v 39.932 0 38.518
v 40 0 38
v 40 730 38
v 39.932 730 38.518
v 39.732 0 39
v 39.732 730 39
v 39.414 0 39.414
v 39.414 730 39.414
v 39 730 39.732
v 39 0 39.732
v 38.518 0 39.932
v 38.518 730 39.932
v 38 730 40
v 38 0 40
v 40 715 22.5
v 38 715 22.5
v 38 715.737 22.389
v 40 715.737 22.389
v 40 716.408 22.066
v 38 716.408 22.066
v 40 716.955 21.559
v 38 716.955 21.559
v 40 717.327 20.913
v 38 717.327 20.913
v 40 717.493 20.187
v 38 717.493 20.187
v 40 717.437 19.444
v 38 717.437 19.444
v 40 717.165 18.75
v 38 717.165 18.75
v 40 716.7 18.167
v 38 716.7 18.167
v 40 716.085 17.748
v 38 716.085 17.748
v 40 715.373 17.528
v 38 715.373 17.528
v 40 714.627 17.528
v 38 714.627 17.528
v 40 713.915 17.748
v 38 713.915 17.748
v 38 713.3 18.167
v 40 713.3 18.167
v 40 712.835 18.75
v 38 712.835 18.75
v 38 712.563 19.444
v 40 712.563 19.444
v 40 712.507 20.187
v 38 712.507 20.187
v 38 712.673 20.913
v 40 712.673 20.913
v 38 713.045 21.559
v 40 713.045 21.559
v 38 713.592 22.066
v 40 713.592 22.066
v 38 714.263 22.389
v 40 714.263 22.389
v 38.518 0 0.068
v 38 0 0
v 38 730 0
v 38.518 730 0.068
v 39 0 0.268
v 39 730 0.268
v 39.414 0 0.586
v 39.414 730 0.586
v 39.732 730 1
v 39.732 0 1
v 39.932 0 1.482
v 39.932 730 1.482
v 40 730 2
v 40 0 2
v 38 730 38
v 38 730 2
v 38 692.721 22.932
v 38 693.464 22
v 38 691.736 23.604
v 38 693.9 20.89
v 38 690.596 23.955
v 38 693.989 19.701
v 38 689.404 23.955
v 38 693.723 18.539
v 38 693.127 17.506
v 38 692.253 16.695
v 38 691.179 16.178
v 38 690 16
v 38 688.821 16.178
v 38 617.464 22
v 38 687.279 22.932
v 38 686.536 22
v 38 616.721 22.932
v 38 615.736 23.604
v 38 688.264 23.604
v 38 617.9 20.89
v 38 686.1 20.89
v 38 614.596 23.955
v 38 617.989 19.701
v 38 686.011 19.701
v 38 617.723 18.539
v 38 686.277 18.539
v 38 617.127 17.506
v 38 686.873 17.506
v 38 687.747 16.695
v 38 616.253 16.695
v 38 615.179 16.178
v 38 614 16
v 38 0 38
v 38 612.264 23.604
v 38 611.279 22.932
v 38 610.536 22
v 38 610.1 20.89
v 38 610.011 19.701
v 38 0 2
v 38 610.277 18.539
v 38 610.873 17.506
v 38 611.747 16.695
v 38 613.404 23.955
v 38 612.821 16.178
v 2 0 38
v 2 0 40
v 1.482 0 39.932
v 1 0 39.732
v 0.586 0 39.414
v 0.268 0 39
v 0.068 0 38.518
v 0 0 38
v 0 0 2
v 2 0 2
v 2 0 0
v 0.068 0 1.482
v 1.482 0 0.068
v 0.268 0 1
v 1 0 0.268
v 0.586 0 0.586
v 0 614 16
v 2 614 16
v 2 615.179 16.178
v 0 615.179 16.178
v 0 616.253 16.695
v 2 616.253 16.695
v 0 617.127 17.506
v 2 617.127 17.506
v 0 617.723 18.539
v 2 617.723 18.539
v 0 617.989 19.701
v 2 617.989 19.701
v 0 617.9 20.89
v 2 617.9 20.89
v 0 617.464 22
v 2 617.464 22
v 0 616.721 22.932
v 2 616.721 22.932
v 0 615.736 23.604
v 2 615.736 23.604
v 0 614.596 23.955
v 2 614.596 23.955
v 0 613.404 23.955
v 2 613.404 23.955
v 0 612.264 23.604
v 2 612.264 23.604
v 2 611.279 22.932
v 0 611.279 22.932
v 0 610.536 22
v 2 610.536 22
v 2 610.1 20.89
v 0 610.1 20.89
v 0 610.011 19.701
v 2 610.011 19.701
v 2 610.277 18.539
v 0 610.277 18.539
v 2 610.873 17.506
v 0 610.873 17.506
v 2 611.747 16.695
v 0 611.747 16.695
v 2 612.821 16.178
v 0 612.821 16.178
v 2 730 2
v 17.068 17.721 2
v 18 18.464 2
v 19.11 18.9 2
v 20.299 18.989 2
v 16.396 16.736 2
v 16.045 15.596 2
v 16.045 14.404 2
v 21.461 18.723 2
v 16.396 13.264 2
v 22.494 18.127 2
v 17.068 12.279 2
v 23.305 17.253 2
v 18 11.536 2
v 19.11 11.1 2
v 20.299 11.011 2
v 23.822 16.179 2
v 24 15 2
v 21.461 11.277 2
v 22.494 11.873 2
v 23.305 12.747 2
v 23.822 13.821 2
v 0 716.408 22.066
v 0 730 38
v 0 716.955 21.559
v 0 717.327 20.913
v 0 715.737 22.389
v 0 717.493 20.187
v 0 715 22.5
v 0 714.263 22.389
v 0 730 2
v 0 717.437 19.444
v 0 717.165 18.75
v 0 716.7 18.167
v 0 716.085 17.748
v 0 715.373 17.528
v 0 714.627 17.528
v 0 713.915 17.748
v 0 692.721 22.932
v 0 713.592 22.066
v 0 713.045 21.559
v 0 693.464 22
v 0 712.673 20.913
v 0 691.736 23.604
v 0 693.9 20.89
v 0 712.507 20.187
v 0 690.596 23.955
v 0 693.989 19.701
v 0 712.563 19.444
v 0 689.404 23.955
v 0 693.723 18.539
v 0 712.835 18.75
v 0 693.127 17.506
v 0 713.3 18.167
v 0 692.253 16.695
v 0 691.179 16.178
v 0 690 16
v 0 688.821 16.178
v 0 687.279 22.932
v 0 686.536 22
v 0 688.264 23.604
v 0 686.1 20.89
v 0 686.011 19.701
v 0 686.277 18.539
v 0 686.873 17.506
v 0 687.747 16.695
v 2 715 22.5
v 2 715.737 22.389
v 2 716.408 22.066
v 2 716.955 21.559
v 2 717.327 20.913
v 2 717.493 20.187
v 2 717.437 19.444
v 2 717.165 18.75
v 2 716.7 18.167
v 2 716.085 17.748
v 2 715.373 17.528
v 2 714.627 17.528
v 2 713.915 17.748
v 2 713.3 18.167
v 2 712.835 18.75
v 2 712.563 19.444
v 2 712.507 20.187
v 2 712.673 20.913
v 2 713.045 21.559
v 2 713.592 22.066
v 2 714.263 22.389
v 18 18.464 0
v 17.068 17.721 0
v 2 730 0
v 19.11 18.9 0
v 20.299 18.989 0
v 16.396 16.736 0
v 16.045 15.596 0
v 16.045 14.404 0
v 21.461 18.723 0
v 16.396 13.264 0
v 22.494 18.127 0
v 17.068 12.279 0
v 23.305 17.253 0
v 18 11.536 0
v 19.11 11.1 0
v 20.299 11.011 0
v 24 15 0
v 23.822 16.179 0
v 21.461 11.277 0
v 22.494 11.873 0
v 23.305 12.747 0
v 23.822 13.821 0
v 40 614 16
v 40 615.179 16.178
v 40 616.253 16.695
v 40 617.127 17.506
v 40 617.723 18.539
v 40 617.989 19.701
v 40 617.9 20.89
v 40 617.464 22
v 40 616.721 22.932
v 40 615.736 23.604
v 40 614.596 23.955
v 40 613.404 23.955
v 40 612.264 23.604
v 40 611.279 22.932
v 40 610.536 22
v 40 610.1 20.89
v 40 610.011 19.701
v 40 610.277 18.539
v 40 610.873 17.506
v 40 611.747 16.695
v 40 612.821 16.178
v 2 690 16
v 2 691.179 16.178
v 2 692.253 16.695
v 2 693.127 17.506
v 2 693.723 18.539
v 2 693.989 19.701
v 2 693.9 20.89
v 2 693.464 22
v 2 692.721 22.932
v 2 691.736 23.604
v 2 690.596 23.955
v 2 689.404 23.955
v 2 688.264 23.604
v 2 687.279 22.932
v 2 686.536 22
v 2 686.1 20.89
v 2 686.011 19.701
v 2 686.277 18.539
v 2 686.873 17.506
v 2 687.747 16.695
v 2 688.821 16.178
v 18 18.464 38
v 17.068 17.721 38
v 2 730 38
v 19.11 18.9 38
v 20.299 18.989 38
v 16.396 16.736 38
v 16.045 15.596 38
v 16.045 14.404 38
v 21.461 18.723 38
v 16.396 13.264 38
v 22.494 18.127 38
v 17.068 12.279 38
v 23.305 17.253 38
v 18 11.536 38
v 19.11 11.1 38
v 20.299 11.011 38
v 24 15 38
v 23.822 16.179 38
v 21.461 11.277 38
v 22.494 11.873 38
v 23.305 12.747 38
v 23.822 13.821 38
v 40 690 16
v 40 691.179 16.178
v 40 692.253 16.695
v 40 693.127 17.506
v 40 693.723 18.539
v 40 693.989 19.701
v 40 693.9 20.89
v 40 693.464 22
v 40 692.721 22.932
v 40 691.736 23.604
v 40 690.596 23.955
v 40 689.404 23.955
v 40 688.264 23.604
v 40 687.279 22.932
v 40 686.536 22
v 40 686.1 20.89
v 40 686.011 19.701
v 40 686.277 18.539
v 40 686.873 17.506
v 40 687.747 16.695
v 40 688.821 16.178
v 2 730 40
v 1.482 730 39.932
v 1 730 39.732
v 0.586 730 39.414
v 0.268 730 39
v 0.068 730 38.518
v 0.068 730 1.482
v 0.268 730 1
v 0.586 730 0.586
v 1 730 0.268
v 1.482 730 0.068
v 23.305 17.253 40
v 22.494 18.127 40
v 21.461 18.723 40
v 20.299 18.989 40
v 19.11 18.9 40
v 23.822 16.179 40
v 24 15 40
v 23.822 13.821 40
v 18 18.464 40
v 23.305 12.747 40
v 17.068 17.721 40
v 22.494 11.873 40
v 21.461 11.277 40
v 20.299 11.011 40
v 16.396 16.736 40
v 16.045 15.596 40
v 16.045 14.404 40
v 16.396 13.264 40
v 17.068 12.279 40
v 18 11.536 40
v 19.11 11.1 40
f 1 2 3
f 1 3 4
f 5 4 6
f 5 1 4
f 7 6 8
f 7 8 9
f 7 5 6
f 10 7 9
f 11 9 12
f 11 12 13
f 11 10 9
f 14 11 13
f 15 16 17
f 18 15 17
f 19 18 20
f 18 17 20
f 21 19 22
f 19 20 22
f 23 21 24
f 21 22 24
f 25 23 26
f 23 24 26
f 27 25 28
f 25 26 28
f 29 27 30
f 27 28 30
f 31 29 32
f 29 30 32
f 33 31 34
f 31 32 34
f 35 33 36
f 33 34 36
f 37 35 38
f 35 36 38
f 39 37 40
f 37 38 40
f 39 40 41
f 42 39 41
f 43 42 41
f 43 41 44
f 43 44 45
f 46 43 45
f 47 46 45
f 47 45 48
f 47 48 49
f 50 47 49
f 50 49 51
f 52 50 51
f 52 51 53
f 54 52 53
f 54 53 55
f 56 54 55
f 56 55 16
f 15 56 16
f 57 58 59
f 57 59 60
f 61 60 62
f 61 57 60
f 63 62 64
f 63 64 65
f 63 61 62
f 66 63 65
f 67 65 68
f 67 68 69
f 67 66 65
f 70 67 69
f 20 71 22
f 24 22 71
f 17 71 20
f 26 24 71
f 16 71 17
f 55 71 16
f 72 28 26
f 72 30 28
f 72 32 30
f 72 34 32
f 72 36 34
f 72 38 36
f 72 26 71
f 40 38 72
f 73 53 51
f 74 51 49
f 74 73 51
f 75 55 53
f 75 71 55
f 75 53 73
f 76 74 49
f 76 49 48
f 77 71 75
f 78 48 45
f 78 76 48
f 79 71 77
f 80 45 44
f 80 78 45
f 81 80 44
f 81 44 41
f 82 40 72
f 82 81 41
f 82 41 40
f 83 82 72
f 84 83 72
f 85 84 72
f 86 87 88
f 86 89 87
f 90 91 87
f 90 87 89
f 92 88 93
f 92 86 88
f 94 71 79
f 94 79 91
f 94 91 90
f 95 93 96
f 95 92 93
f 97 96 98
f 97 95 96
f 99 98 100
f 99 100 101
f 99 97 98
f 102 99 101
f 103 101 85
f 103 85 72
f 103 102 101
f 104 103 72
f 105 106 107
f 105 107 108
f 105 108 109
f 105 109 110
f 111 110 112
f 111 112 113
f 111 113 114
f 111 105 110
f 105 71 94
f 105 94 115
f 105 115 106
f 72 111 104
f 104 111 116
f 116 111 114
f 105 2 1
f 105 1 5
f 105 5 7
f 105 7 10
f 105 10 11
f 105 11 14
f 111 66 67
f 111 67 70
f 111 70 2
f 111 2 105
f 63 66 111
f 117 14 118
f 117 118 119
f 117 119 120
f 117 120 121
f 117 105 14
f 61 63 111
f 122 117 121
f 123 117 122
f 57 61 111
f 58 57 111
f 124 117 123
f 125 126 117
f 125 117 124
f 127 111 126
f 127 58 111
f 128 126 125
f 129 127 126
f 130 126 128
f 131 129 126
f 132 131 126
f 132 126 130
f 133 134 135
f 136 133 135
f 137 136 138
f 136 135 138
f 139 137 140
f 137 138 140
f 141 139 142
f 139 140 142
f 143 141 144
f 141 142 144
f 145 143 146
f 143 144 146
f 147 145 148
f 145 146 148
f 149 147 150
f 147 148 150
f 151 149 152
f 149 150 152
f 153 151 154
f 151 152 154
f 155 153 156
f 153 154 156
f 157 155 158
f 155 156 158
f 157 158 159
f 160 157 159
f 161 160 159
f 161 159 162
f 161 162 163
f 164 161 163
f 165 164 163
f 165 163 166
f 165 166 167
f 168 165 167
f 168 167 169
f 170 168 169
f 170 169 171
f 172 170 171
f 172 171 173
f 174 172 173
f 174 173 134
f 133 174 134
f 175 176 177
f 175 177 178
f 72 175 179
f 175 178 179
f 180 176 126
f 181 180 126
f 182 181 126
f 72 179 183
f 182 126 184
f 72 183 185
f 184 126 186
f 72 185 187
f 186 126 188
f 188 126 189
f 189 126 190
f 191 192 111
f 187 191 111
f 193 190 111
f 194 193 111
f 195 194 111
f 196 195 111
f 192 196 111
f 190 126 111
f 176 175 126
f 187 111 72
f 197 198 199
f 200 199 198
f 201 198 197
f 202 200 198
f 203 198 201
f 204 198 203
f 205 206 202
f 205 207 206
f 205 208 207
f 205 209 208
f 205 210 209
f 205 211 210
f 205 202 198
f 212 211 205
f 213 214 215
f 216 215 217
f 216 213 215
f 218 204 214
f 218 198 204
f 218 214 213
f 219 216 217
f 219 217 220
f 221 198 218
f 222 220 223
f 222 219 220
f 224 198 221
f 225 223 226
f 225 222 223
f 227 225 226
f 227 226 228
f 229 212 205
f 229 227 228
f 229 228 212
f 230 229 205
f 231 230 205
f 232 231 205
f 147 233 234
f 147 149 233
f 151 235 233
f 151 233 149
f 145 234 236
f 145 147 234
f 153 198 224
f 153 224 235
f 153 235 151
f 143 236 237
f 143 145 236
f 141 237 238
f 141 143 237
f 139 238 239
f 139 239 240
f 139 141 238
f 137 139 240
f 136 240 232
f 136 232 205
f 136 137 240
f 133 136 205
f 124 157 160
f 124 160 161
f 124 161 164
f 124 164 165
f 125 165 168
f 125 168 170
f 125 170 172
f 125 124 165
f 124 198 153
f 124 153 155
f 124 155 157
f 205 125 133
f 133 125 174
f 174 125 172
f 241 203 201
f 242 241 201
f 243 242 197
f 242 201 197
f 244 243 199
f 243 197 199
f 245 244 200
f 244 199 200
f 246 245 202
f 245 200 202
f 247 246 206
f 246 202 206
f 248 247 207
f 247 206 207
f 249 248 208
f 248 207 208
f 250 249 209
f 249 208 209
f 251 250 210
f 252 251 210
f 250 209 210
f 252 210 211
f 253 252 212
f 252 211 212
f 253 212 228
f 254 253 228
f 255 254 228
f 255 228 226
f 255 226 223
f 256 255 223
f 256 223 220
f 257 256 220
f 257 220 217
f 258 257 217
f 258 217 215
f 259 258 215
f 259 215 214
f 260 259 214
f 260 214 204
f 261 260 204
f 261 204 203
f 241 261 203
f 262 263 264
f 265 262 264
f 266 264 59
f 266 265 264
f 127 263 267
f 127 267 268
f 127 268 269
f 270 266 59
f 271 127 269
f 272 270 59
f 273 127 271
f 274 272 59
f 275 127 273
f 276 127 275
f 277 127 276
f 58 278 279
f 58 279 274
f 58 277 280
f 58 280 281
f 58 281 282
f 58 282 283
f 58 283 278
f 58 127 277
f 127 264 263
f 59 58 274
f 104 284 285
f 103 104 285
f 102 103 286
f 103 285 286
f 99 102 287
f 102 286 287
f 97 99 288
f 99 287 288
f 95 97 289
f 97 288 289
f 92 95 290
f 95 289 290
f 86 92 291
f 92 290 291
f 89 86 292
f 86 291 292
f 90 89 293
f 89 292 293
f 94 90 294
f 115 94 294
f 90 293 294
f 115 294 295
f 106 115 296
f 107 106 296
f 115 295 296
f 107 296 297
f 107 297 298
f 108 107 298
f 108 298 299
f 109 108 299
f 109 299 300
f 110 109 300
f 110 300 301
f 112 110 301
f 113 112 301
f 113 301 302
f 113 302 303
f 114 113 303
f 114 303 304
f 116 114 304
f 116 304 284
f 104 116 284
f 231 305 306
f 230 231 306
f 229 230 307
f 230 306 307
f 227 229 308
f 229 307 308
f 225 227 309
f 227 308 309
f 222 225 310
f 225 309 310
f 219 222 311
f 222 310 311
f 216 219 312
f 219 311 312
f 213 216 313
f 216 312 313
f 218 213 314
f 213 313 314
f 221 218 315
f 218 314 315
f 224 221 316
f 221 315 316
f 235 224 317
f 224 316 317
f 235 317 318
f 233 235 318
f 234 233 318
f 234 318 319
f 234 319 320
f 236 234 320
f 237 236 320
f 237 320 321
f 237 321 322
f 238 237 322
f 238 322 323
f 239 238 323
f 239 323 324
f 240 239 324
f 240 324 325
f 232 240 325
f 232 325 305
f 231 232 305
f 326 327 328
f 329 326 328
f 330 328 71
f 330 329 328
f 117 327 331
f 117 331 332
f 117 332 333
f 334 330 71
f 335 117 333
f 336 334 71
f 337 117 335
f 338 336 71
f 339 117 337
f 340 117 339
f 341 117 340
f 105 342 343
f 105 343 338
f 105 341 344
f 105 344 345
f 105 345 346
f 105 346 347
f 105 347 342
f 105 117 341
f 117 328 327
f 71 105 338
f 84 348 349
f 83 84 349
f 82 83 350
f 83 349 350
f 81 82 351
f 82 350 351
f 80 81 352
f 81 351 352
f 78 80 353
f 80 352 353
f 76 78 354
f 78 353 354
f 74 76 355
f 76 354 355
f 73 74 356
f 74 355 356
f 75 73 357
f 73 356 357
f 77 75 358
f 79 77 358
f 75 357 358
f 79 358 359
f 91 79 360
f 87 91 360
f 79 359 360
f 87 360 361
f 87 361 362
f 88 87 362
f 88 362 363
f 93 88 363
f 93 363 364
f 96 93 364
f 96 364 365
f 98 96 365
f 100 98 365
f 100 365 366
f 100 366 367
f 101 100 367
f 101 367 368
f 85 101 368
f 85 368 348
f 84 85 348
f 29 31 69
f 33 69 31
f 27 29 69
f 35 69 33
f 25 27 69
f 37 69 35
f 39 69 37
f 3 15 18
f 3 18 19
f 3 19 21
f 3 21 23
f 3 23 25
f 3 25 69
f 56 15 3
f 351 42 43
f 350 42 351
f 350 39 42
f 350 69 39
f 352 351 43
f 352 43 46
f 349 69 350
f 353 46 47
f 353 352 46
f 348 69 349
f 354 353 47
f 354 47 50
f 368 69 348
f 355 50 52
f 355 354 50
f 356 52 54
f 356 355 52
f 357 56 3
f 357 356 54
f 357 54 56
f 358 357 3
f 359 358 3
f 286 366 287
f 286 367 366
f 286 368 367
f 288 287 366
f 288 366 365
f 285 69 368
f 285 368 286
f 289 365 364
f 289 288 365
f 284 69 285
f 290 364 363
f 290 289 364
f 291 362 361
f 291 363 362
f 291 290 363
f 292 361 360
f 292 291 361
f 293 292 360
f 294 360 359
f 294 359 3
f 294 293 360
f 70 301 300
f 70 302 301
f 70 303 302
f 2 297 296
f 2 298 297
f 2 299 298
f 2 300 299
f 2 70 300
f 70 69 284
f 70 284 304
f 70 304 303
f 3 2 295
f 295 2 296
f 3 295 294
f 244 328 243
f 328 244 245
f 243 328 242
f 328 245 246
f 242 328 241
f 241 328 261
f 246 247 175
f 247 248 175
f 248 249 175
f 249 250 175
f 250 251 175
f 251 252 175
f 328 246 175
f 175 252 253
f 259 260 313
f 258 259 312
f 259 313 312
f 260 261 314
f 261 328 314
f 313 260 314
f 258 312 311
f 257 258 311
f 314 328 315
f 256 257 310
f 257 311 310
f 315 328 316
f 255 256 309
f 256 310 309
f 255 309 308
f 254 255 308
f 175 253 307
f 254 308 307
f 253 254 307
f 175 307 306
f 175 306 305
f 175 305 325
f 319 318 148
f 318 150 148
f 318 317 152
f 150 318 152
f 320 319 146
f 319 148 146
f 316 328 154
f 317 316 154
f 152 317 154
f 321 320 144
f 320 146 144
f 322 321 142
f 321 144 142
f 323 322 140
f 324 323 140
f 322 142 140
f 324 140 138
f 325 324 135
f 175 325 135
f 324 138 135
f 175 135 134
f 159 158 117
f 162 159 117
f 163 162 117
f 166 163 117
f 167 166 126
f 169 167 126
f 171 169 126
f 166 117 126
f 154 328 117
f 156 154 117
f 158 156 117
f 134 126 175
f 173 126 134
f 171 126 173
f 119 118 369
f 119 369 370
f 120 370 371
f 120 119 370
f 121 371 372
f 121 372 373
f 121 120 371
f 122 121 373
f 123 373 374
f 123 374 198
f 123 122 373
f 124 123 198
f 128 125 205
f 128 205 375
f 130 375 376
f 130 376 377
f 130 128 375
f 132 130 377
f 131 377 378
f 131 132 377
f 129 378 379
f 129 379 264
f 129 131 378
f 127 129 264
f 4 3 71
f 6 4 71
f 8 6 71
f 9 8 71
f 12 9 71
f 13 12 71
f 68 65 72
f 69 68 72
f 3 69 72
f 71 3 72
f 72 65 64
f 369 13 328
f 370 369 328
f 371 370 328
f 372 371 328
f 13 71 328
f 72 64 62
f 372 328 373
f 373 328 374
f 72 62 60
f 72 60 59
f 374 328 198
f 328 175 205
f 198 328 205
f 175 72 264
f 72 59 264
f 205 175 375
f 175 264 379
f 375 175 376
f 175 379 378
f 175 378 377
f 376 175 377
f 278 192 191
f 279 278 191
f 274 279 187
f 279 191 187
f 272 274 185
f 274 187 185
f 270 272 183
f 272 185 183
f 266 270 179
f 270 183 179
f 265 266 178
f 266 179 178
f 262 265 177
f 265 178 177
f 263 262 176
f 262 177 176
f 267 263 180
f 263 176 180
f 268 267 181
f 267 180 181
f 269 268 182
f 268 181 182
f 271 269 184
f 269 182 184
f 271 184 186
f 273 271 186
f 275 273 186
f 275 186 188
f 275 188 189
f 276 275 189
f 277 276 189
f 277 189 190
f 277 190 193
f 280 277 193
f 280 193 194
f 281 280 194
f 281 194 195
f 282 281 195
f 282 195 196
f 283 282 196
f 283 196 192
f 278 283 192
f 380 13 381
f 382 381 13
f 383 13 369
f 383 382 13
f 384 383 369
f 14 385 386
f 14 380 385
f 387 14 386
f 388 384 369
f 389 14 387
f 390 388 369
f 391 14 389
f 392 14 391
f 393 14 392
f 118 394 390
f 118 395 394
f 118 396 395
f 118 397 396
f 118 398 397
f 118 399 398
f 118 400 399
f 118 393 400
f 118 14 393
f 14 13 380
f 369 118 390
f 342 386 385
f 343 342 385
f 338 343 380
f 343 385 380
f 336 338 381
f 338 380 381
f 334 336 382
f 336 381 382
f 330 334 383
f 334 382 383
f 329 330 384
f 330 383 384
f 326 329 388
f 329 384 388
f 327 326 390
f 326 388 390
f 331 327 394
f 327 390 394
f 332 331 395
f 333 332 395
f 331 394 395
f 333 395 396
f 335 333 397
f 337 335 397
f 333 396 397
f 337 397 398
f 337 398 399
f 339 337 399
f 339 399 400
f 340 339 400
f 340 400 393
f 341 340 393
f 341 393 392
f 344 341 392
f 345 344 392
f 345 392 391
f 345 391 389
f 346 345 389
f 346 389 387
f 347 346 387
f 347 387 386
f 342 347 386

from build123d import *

# Parameters (mm, degrees)
SKETCH1_W                      = 36
SKETCH1_H                      = 36
EXTRUDE_THIN1_DEPTH            = 730
CUT_EXTRUDE1_REACH             = 734.189
SKETCH2_R                      = 4
CUT_EXTRUDE1_DIRECTION_2_DEPTH = 733.188500319
CUT_EXTRUDE4_REACH             = 734.189
SKETCH5_R                      = 2.5
CUT_EXTRUDE6_REACH             = 734.189
SKETCH6_R                      = 4


with BuildPart() as part:
    # Sketch1 → Extrude-Thin1 (new body)
    with BuildSketch(Plane(origin=(0, 0, 0), x_dir=(1, 0, 0), z_dir=(0, 1, 0))):
        with BuildLine():
            Line((2, 0), (38, 0))
            ThreePointArc((38, 0), (39.414213562, -0.585786438), (40, -2))
            Line((40, -2), (40, -38))
            ThreePointArc((40, -38), (39.414213562, -39.414213562), (38, -40))
            Line((38, -40), (2, -40))
            ThreePointArc((2, -40), (0.585786438, -39.414213562), (0, -38))
            Line((0, -38), (0, -2))
            ThreePointArc((0, -2), (0.585786438, -0.585786438), (2, 0))
        make_face()
        with Locations((20, -20)):
            Rectangle(SKETCH1_W, SKETCH1_H, mode=Mode.SUBTRACT)
    extrude(amount=EXTRUDE_THIN1_DEPTH)

    # Cut-Extrude1: up to this face of the body (flat: up to its plane)
    cut_extrude1_end = Plane(part.part.faces().sort_by_distance((20, 365, 0))[0])
    # Sketch2 → Cut-Extrude1 (cut, up to the picked face)
    with BuildSketch(Plane.XY.offset(40), mode=Mode.PRIVATE) as cut_extrude1_sk1:
        with Locations((20, 15)):
            Circle(SKETCH2_R)
    cut_extrude1_tool1 = split(extrude(cut_extrude1_sk1.sketch, amount=-CUT_EXTRUDE1_REACH, mode=Mode.PRIVATE), bisect_by=cut_extrude1_end, keep=Keep.BOTH, mode=Mode.PRIVATE)
    add(cut_extrude1_tool1.solids().sort_by(Axis((20, 15, 40), (0, 0, -1)))[0], mode=Mode.SUBTRACT)

    # Sketch2 → Cut-Extrude1 direction 2 (cut)
    with BuildSketch(Plane.XY.offset(40)):
        with Locations((20, 15)):
            Circle(SKETCH2_R)
    extrude(amount=CUT_EXTRUDE1_DIRECTION_2_DEPTH, mode=Mode.SUBTRACT)

    # Cut-Extrude4: up to this face of the body (flat: up to its plane)
    cut_extrude4_end = Plane(part.part.faces().sort_by_distance((40, 365, 20))[0])
    # Sketch5 → Cut-Extrude4 (cut, up to the picked face)
    with BuildSketch(Plane.ZY, mode=Mode.PRIVATE) as cut_extrude4_sk1:
        with Locations((20, 715)):
            Circle(SKETCH5_R)
    cut_extrude4_tool1 = split(extrude(cut_extrude4_sk1.sketch, amount=-CUT_EXTRUDE4_REACH, mode=Mode.PRIVATE), bisect_by=cut_extrude4_end, keep=Keep.BOTH, mode=Mode.PRIVATE)
    add(cut_extrude4_tool1.solids().sort_by(Axis((0, 715, 20), (1, 0, 0)))[0], mode=Mode.SUBTRACT)

    # Cut-Extrude6: up to this face of the body (flat: up to its plane)
    cut_extrude6_end = Plane(part.part.faces().sort_by_distance((0, 364.738303945, 20))[0])
    # Sketch6 → Cut-Extrude6 (cut, up to the picked face)
    with BuildSketch(Plane(origin=(40, 0, 0), x_dir=(0, 0, -1), z_dir=(1, 0, 0)), mode=Mode.PRIVATE) as cut_extrude6_sk1:
        with Locations((-20, 690)):
            Circle(SKETCH6_R)
    cut_extrude6_tool1 = split(extrude(cut_extrude6_sk1.sketch, amount=-CUT_EXTRUDE6_REACH, mode=Mode.PRIVATE), bisect_by=cut_extrude6_end, keep=Keep.BOTH, mode=Mode.PRIVATE)
    # Sketch6 → Cut-Extrude6 (cut, up to the picked face)
    with BuildSketch(Plane(origin=(40, 0, 0), x_dir=(0, 0, -1), z_dir=(1, 0, 0)), mode=Mode.PRIVATE) as cut_extrude6_sk2:
        with Locations((-20, 614)):
            Circle(SKETCH6_R)
    cut_extrude6_tool2 = split(extrude(cut_extrude6_sk2.sketch, amount=-CUT_EXTRUDE6_REACH, mode=Mode.PRIVATE), bisect_by=cut_extrude6_end, keep=Keep.BOTH, mode=Mode.PRIVATE)
    add(cut_extrude6_tool1.solids().sort_by(Axis((40, 690, 20), (-1, 0, 0)))[0], mode=Mode.SUBTRACT)
    add(cut_extrude6_tool2.solids().sort_by(Axis((40, 614, 20), (-1, 0, 0)))[0], mode=Mode.SUBTRACT)


solid = part.part
